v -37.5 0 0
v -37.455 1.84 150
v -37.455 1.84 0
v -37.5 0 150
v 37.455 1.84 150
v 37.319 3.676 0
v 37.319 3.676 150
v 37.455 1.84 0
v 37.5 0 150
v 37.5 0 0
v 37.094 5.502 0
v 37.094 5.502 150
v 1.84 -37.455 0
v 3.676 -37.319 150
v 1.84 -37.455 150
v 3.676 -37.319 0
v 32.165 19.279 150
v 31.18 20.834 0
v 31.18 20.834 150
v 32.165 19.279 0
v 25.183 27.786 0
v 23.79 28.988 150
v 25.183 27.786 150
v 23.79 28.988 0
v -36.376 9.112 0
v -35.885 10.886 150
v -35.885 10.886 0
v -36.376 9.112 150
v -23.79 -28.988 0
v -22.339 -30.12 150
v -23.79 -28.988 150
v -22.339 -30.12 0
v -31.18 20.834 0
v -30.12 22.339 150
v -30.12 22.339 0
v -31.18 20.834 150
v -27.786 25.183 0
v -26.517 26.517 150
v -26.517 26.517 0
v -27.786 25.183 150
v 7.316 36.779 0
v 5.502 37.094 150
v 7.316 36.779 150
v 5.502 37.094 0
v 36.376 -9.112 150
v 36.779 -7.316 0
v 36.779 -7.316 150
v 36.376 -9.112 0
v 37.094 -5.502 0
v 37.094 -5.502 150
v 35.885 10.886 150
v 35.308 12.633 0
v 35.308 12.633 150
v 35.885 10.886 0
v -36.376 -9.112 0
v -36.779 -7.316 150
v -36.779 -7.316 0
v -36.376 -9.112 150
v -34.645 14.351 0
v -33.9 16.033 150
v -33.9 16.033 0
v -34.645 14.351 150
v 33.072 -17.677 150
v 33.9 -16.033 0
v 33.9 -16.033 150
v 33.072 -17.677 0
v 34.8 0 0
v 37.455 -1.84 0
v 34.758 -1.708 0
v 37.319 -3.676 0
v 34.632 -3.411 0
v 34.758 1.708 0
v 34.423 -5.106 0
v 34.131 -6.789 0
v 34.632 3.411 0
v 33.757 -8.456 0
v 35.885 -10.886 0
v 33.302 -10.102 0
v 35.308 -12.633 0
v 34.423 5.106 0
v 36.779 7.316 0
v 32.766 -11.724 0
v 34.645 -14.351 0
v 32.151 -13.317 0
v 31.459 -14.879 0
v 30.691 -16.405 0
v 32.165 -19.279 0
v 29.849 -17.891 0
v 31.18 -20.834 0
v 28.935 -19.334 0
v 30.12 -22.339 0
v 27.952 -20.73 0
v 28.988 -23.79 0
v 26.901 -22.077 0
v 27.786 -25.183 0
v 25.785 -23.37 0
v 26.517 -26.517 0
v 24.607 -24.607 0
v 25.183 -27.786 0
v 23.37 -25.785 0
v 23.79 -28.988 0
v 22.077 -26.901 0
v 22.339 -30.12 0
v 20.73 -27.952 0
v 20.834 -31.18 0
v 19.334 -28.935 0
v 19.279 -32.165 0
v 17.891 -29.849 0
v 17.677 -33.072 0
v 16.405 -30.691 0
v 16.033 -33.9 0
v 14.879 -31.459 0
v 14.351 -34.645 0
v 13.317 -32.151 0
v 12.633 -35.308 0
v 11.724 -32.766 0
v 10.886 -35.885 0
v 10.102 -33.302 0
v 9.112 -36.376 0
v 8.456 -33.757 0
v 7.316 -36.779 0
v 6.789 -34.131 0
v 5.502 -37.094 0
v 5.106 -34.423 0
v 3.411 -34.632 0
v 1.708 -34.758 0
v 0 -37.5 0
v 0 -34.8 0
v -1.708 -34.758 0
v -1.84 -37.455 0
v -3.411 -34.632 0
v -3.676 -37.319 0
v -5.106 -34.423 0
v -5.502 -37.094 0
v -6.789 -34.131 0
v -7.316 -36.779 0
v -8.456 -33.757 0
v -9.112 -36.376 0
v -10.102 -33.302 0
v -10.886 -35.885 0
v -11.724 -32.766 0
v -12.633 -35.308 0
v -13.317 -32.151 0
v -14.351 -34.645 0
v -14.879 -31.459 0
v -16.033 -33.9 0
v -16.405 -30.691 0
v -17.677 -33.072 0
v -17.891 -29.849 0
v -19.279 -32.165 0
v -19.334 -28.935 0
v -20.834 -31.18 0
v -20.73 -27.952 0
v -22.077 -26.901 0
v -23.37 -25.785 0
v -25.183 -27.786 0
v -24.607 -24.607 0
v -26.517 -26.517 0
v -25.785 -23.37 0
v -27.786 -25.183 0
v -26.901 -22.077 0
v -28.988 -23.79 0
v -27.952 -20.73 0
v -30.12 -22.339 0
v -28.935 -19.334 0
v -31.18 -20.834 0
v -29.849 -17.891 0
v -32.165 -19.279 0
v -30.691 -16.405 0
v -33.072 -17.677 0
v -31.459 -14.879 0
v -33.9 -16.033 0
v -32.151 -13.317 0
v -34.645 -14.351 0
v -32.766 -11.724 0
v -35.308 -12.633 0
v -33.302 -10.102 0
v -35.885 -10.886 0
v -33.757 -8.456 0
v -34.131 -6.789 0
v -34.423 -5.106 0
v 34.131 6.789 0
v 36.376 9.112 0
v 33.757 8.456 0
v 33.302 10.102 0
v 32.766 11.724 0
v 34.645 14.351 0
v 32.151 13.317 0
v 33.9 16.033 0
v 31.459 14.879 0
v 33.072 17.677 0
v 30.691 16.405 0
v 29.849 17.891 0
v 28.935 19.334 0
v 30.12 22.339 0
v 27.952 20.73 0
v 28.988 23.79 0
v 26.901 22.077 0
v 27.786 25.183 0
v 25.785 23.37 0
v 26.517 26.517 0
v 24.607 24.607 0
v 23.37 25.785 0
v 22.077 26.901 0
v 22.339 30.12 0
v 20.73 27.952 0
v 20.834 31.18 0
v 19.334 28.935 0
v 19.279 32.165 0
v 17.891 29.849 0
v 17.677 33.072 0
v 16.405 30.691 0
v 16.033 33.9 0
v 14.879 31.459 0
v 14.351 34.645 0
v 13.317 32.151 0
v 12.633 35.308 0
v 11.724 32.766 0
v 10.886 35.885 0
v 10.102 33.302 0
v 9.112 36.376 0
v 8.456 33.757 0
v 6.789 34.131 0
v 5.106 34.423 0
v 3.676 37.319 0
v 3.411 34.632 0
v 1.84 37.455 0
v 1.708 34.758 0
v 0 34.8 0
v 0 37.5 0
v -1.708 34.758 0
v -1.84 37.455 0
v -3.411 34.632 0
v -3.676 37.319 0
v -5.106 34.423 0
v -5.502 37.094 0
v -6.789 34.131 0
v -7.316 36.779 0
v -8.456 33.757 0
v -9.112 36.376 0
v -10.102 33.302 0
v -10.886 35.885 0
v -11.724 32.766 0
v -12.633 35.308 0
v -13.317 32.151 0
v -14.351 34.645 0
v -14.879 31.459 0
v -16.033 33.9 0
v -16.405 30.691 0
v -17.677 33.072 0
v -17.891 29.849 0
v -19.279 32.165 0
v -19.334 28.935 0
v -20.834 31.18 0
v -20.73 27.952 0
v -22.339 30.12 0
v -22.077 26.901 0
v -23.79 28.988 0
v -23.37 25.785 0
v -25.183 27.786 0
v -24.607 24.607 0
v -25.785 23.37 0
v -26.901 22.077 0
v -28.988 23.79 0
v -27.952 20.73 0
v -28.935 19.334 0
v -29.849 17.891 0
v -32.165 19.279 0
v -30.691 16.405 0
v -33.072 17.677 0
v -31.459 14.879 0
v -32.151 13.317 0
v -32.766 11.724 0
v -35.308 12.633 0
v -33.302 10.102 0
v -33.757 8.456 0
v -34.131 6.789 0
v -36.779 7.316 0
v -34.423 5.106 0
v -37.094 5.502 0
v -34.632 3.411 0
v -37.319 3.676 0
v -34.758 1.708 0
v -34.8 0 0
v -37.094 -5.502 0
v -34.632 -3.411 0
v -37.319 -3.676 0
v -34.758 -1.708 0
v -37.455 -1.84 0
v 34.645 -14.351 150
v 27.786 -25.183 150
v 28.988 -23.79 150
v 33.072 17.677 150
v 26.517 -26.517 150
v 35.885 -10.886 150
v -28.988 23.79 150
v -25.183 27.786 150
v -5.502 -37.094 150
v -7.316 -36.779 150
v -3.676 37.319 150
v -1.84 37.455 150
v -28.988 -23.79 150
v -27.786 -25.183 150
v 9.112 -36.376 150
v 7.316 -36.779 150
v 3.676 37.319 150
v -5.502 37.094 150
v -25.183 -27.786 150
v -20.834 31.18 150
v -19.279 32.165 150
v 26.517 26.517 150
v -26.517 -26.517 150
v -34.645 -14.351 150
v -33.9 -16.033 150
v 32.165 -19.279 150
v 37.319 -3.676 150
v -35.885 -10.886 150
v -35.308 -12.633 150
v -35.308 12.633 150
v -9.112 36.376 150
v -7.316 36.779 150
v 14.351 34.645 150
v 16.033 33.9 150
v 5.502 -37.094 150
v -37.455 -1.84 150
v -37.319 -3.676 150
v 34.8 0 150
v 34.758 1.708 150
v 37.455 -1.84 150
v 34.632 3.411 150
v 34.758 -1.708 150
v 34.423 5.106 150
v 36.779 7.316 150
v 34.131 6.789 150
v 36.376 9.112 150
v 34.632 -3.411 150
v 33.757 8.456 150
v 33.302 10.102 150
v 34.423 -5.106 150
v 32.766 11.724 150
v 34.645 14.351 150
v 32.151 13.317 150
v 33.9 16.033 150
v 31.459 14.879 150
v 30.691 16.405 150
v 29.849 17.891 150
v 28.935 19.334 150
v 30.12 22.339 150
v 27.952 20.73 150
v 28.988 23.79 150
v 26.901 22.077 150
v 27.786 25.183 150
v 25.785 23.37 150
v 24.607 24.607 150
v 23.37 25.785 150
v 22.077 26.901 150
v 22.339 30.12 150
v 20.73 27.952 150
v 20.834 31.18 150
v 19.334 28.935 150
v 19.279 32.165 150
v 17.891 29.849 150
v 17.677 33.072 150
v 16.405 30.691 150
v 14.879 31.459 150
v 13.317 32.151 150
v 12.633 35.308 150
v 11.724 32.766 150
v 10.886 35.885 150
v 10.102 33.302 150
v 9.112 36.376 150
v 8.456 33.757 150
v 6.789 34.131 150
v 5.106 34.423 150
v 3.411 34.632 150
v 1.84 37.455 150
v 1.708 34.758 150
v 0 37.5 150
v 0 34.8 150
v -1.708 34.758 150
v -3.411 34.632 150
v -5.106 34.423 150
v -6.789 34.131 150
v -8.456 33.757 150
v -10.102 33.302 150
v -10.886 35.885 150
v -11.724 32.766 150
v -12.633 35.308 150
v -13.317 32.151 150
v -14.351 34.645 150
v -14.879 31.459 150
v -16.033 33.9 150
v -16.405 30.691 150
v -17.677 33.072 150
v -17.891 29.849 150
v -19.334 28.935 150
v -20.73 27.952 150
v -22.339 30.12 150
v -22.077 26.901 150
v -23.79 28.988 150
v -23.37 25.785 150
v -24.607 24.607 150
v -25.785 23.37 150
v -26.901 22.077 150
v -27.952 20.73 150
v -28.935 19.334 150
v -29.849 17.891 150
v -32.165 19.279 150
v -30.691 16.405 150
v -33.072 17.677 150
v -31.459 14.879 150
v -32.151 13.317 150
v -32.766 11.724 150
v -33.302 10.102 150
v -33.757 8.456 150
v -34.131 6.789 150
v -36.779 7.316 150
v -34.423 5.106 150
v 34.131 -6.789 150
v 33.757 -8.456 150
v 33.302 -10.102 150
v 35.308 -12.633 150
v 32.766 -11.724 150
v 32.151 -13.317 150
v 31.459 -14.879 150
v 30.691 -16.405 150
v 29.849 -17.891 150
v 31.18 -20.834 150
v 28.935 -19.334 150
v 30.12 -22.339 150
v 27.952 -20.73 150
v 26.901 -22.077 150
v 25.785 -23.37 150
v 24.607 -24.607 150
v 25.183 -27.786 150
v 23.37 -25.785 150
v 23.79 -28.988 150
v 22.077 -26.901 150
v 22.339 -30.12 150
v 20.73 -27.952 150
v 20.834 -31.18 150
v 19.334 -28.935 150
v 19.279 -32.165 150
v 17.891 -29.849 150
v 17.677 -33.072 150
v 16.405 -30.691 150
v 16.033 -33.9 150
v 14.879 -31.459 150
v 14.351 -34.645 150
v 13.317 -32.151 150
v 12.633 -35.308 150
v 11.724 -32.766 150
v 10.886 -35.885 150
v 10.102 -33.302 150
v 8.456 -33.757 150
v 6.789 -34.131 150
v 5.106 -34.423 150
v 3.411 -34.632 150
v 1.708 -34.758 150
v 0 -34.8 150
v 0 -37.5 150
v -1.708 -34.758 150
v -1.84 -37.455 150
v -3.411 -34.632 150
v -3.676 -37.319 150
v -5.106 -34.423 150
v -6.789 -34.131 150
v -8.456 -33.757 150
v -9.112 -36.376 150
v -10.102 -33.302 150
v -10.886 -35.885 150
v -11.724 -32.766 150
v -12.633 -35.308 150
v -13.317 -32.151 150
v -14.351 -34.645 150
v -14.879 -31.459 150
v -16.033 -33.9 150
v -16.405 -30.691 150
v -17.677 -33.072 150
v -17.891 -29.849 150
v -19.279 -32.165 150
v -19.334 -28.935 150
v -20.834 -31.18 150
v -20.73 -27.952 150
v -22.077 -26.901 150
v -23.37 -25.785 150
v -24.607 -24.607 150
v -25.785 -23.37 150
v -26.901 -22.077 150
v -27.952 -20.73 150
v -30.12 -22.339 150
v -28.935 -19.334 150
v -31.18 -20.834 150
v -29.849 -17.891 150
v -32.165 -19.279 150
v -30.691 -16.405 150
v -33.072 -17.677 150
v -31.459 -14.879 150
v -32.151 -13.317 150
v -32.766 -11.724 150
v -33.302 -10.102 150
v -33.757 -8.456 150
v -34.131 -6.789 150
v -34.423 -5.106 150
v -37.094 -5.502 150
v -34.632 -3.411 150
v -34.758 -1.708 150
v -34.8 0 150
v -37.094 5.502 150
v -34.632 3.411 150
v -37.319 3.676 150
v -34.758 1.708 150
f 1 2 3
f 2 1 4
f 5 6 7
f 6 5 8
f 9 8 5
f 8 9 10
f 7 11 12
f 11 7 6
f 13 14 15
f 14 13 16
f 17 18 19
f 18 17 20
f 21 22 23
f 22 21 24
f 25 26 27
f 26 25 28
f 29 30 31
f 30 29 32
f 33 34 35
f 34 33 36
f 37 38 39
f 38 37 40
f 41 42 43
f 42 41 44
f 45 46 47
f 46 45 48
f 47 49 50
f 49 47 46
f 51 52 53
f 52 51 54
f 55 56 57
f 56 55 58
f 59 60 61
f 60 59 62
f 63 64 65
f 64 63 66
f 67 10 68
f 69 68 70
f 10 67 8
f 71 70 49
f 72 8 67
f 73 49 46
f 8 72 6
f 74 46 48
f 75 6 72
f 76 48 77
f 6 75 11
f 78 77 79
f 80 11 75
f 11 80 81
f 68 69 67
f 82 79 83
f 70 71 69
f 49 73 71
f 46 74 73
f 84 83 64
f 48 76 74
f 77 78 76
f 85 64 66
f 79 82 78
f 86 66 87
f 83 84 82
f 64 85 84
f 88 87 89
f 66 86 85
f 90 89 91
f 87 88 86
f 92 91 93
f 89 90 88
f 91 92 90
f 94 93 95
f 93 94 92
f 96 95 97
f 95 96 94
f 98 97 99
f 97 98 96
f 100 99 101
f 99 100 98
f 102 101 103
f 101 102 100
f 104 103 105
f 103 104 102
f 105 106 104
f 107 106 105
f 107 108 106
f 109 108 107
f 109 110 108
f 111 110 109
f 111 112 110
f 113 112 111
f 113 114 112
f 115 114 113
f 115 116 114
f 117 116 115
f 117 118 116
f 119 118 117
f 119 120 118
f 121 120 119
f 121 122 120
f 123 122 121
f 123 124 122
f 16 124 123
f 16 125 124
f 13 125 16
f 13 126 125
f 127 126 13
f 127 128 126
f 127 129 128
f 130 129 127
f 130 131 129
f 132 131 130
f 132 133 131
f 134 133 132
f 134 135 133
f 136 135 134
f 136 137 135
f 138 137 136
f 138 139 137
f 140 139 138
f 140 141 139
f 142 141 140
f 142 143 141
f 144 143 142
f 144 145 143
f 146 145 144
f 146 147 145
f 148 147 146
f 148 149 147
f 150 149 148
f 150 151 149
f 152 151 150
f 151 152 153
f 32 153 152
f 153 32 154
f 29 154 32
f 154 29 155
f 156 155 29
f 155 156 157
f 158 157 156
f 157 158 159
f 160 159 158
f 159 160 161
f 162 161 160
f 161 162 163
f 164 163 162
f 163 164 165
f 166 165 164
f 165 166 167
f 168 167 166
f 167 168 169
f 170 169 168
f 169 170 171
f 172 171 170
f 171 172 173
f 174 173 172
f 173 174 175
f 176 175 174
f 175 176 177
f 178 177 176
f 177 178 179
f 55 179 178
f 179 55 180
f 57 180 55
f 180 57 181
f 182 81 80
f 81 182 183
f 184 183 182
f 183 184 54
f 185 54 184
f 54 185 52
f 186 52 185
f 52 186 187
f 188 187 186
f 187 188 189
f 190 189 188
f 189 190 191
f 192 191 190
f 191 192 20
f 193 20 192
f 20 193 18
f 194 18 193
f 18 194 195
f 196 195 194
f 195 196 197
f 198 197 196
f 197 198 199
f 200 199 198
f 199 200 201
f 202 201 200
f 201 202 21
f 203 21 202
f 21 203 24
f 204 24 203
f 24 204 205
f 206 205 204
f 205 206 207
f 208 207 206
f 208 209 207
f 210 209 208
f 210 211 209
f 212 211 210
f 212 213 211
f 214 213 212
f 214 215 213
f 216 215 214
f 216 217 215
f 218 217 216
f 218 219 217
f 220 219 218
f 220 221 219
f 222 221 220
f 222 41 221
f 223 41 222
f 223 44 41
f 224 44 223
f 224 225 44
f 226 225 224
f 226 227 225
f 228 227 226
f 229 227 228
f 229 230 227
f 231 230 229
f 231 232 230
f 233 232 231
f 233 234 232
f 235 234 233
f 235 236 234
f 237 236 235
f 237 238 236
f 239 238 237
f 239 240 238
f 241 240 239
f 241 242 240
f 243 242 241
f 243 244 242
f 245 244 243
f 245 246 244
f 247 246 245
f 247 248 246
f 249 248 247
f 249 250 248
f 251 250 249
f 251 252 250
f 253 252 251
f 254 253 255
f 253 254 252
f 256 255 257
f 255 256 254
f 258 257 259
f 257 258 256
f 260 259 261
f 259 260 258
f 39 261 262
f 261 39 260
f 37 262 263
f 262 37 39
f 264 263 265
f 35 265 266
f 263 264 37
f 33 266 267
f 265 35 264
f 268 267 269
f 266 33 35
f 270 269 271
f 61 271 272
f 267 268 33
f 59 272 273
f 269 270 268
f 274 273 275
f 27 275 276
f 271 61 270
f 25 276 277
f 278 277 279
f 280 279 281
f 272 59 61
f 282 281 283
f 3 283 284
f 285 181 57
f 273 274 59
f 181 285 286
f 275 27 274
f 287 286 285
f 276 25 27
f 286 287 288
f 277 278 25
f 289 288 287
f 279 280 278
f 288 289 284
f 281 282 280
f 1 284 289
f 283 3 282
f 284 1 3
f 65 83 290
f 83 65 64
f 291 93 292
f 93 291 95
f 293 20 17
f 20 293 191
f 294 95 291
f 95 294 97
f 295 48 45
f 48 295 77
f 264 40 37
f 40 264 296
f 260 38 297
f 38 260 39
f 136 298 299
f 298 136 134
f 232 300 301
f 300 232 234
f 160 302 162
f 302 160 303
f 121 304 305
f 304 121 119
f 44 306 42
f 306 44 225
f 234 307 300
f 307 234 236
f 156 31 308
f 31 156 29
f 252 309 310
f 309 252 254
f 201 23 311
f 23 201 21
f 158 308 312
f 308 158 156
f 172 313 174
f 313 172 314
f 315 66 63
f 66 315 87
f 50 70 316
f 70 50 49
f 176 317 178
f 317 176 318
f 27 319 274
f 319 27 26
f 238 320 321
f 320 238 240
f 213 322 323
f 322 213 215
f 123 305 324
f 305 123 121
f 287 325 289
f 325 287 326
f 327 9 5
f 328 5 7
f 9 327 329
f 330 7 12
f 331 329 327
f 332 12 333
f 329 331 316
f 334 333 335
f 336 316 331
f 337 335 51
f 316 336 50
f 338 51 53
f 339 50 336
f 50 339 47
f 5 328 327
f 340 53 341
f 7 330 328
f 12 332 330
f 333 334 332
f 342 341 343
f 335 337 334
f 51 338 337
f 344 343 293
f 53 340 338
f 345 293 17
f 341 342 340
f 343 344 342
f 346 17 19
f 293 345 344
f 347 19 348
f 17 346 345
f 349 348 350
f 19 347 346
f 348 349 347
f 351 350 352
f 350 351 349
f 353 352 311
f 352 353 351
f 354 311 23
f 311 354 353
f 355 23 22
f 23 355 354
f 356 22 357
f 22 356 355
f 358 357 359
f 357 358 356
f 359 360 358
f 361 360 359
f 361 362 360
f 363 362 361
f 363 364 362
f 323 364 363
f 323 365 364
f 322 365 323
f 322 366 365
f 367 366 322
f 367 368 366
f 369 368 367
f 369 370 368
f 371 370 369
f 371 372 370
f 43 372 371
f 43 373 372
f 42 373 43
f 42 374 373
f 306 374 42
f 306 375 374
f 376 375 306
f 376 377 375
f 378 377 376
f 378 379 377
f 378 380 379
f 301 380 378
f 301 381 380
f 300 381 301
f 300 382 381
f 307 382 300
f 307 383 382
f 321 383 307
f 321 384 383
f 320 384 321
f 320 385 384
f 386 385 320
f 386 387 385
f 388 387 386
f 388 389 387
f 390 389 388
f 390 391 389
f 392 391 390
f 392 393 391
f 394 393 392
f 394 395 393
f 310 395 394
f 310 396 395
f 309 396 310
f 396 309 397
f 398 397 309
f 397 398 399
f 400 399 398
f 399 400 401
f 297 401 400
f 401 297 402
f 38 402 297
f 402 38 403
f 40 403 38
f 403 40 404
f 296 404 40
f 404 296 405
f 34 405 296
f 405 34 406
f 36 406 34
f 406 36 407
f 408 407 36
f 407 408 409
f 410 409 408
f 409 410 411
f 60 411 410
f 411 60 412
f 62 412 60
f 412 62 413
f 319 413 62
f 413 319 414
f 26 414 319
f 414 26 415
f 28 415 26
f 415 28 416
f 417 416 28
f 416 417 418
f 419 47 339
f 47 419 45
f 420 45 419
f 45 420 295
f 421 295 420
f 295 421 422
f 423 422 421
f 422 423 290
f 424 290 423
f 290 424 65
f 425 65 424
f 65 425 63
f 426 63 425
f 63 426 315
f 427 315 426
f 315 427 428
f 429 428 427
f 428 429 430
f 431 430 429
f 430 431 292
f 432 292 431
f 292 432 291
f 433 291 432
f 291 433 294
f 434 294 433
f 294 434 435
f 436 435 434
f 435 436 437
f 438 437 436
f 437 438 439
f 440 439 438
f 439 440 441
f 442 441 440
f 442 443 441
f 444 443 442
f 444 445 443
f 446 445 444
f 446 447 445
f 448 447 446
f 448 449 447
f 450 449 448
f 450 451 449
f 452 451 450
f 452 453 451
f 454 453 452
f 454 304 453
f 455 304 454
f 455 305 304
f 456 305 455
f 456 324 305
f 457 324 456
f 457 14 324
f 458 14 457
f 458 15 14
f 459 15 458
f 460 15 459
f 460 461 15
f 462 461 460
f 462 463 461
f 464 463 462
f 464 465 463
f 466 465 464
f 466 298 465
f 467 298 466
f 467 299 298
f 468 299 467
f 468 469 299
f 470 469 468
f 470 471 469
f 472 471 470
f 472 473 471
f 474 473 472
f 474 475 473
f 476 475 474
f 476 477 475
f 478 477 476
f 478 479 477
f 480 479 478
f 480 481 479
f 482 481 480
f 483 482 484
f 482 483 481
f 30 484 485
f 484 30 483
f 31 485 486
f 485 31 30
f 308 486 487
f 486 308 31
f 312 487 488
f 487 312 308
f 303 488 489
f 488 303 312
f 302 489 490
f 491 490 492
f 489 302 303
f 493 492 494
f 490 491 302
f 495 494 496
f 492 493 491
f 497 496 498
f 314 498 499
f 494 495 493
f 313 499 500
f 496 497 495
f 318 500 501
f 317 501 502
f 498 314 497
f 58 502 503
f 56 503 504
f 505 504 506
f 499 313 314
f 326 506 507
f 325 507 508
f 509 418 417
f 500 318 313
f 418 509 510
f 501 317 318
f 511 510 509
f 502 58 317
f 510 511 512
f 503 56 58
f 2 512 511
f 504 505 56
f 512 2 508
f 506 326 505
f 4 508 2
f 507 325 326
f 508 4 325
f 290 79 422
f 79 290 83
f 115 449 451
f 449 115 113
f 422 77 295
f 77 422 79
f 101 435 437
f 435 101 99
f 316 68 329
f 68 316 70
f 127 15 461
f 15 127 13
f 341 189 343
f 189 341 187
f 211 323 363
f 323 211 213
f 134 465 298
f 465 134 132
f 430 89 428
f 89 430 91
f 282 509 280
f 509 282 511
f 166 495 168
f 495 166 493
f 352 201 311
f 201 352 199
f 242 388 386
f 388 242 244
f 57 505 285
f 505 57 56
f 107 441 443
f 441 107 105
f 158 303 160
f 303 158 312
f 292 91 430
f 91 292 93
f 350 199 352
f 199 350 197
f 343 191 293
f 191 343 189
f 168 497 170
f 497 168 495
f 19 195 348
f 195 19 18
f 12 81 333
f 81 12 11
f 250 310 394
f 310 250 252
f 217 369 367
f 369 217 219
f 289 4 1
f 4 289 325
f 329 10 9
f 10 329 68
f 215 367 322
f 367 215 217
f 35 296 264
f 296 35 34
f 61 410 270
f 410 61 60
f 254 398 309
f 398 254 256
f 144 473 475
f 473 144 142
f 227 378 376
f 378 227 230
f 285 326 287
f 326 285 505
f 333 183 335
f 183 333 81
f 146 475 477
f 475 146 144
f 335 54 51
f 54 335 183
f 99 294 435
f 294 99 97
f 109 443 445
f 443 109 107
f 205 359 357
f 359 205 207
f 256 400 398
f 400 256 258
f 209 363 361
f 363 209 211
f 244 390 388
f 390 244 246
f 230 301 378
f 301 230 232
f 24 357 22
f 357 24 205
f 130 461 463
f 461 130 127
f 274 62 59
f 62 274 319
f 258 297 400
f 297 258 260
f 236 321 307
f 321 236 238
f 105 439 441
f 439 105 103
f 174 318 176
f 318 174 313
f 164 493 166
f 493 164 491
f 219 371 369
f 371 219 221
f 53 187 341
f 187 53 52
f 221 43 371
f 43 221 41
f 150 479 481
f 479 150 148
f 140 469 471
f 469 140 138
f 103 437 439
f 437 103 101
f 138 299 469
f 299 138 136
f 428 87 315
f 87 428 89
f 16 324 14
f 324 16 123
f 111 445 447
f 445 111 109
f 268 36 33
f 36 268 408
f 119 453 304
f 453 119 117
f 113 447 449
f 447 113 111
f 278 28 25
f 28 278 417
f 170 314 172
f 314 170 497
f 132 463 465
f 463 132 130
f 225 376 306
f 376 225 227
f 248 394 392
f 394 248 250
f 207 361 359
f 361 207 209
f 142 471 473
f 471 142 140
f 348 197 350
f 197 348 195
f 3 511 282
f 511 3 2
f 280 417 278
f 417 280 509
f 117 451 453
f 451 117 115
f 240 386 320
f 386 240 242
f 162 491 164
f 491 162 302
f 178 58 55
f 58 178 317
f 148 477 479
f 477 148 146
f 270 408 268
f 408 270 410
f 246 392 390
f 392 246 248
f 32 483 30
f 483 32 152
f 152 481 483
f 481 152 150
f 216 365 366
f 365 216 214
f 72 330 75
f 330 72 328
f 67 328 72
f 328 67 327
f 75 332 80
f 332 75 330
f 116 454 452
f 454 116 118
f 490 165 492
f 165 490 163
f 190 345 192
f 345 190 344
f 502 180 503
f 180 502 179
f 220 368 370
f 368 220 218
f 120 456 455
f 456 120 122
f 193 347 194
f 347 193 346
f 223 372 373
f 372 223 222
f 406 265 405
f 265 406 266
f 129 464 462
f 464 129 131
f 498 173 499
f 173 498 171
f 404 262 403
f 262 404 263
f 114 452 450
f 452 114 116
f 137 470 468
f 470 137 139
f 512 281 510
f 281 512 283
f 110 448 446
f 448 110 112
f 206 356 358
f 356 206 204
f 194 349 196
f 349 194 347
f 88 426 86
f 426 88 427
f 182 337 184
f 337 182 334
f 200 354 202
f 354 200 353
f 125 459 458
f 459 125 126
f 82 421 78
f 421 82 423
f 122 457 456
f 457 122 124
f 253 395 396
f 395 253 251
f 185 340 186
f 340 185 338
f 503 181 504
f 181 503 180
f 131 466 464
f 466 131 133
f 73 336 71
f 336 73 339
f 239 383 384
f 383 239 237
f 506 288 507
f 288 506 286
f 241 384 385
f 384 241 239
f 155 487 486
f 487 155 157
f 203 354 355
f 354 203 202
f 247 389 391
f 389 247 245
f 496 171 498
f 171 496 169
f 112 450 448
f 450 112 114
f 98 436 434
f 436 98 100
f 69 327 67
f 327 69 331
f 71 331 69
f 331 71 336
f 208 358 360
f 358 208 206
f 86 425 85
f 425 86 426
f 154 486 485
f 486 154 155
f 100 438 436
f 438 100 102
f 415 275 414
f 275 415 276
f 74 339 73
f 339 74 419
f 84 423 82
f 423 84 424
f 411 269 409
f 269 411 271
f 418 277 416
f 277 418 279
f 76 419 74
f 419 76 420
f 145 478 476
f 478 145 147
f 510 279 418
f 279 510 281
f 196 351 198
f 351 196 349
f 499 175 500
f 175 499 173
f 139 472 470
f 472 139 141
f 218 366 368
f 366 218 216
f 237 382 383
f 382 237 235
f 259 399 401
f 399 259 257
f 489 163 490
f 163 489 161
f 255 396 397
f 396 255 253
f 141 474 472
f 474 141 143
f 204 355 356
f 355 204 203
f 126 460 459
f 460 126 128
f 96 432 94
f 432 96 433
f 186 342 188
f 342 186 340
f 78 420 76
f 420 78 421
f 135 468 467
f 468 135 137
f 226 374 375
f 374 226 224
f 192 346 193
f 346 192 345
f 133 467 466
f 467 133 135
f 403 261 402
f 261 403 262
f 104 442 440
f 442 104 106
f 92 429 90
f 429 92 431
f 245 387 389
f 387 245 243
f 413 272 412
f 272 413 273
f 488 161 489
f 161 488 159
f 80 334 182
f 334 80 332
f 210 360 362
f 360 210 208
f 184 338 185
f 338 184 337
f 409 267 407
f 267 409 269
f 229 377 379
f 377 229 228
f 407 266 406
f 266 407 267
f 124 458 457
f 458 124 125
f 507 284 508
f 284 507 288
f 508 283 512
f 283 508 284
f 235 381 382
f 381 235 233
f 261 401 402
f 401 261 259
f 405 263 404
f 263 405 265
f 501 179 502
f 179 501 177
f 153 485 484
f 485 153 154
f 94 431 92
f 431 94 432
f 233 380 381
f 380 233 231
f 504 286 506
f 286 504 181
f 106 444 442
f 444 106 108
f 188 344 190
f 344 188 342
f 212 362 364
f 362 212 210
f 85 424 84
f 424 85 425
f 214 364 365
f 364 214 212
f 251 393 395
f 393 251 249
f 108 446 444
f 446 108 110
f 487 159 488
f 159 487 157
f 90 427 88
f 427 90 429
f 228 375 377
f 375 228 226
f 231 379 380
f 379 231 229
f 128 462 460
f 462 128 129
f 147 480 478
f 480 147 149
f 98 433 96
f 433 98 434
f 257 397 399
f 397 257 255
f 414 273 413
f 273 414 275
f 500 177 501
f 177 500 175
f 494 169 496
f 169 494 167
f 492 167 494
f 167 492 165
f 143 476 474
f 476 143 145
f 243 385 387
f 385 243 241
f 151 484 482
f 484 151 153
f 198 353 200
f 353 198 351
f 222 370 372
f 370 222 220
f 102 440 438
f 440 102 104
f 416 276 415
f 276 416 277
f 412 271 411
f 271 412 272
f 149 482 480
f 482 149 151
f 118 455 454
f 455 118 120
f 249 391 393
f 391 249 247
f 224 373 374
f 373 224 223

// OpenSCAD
$fn = 128;

// HT pipe parameters (approximate for HT 75)
pipe_length = 150;          // mm
outer_diameter = 75;        // mm (nominal)
wall_thickness = 2.7;       // mm (typical HT wall)
inner_diameter = outer_diameter - 2*wall_thickness;

module ht_pipe(od=75, id=69.6, L=150) {
    difference() {
        cylinder(h=L, d=od);
        translate([0,0,-0.5])
            cylinder(h=L+1, d=id);
    }
}

ht_pipe(outer_diameter, inner_diameter, pipe_length);
